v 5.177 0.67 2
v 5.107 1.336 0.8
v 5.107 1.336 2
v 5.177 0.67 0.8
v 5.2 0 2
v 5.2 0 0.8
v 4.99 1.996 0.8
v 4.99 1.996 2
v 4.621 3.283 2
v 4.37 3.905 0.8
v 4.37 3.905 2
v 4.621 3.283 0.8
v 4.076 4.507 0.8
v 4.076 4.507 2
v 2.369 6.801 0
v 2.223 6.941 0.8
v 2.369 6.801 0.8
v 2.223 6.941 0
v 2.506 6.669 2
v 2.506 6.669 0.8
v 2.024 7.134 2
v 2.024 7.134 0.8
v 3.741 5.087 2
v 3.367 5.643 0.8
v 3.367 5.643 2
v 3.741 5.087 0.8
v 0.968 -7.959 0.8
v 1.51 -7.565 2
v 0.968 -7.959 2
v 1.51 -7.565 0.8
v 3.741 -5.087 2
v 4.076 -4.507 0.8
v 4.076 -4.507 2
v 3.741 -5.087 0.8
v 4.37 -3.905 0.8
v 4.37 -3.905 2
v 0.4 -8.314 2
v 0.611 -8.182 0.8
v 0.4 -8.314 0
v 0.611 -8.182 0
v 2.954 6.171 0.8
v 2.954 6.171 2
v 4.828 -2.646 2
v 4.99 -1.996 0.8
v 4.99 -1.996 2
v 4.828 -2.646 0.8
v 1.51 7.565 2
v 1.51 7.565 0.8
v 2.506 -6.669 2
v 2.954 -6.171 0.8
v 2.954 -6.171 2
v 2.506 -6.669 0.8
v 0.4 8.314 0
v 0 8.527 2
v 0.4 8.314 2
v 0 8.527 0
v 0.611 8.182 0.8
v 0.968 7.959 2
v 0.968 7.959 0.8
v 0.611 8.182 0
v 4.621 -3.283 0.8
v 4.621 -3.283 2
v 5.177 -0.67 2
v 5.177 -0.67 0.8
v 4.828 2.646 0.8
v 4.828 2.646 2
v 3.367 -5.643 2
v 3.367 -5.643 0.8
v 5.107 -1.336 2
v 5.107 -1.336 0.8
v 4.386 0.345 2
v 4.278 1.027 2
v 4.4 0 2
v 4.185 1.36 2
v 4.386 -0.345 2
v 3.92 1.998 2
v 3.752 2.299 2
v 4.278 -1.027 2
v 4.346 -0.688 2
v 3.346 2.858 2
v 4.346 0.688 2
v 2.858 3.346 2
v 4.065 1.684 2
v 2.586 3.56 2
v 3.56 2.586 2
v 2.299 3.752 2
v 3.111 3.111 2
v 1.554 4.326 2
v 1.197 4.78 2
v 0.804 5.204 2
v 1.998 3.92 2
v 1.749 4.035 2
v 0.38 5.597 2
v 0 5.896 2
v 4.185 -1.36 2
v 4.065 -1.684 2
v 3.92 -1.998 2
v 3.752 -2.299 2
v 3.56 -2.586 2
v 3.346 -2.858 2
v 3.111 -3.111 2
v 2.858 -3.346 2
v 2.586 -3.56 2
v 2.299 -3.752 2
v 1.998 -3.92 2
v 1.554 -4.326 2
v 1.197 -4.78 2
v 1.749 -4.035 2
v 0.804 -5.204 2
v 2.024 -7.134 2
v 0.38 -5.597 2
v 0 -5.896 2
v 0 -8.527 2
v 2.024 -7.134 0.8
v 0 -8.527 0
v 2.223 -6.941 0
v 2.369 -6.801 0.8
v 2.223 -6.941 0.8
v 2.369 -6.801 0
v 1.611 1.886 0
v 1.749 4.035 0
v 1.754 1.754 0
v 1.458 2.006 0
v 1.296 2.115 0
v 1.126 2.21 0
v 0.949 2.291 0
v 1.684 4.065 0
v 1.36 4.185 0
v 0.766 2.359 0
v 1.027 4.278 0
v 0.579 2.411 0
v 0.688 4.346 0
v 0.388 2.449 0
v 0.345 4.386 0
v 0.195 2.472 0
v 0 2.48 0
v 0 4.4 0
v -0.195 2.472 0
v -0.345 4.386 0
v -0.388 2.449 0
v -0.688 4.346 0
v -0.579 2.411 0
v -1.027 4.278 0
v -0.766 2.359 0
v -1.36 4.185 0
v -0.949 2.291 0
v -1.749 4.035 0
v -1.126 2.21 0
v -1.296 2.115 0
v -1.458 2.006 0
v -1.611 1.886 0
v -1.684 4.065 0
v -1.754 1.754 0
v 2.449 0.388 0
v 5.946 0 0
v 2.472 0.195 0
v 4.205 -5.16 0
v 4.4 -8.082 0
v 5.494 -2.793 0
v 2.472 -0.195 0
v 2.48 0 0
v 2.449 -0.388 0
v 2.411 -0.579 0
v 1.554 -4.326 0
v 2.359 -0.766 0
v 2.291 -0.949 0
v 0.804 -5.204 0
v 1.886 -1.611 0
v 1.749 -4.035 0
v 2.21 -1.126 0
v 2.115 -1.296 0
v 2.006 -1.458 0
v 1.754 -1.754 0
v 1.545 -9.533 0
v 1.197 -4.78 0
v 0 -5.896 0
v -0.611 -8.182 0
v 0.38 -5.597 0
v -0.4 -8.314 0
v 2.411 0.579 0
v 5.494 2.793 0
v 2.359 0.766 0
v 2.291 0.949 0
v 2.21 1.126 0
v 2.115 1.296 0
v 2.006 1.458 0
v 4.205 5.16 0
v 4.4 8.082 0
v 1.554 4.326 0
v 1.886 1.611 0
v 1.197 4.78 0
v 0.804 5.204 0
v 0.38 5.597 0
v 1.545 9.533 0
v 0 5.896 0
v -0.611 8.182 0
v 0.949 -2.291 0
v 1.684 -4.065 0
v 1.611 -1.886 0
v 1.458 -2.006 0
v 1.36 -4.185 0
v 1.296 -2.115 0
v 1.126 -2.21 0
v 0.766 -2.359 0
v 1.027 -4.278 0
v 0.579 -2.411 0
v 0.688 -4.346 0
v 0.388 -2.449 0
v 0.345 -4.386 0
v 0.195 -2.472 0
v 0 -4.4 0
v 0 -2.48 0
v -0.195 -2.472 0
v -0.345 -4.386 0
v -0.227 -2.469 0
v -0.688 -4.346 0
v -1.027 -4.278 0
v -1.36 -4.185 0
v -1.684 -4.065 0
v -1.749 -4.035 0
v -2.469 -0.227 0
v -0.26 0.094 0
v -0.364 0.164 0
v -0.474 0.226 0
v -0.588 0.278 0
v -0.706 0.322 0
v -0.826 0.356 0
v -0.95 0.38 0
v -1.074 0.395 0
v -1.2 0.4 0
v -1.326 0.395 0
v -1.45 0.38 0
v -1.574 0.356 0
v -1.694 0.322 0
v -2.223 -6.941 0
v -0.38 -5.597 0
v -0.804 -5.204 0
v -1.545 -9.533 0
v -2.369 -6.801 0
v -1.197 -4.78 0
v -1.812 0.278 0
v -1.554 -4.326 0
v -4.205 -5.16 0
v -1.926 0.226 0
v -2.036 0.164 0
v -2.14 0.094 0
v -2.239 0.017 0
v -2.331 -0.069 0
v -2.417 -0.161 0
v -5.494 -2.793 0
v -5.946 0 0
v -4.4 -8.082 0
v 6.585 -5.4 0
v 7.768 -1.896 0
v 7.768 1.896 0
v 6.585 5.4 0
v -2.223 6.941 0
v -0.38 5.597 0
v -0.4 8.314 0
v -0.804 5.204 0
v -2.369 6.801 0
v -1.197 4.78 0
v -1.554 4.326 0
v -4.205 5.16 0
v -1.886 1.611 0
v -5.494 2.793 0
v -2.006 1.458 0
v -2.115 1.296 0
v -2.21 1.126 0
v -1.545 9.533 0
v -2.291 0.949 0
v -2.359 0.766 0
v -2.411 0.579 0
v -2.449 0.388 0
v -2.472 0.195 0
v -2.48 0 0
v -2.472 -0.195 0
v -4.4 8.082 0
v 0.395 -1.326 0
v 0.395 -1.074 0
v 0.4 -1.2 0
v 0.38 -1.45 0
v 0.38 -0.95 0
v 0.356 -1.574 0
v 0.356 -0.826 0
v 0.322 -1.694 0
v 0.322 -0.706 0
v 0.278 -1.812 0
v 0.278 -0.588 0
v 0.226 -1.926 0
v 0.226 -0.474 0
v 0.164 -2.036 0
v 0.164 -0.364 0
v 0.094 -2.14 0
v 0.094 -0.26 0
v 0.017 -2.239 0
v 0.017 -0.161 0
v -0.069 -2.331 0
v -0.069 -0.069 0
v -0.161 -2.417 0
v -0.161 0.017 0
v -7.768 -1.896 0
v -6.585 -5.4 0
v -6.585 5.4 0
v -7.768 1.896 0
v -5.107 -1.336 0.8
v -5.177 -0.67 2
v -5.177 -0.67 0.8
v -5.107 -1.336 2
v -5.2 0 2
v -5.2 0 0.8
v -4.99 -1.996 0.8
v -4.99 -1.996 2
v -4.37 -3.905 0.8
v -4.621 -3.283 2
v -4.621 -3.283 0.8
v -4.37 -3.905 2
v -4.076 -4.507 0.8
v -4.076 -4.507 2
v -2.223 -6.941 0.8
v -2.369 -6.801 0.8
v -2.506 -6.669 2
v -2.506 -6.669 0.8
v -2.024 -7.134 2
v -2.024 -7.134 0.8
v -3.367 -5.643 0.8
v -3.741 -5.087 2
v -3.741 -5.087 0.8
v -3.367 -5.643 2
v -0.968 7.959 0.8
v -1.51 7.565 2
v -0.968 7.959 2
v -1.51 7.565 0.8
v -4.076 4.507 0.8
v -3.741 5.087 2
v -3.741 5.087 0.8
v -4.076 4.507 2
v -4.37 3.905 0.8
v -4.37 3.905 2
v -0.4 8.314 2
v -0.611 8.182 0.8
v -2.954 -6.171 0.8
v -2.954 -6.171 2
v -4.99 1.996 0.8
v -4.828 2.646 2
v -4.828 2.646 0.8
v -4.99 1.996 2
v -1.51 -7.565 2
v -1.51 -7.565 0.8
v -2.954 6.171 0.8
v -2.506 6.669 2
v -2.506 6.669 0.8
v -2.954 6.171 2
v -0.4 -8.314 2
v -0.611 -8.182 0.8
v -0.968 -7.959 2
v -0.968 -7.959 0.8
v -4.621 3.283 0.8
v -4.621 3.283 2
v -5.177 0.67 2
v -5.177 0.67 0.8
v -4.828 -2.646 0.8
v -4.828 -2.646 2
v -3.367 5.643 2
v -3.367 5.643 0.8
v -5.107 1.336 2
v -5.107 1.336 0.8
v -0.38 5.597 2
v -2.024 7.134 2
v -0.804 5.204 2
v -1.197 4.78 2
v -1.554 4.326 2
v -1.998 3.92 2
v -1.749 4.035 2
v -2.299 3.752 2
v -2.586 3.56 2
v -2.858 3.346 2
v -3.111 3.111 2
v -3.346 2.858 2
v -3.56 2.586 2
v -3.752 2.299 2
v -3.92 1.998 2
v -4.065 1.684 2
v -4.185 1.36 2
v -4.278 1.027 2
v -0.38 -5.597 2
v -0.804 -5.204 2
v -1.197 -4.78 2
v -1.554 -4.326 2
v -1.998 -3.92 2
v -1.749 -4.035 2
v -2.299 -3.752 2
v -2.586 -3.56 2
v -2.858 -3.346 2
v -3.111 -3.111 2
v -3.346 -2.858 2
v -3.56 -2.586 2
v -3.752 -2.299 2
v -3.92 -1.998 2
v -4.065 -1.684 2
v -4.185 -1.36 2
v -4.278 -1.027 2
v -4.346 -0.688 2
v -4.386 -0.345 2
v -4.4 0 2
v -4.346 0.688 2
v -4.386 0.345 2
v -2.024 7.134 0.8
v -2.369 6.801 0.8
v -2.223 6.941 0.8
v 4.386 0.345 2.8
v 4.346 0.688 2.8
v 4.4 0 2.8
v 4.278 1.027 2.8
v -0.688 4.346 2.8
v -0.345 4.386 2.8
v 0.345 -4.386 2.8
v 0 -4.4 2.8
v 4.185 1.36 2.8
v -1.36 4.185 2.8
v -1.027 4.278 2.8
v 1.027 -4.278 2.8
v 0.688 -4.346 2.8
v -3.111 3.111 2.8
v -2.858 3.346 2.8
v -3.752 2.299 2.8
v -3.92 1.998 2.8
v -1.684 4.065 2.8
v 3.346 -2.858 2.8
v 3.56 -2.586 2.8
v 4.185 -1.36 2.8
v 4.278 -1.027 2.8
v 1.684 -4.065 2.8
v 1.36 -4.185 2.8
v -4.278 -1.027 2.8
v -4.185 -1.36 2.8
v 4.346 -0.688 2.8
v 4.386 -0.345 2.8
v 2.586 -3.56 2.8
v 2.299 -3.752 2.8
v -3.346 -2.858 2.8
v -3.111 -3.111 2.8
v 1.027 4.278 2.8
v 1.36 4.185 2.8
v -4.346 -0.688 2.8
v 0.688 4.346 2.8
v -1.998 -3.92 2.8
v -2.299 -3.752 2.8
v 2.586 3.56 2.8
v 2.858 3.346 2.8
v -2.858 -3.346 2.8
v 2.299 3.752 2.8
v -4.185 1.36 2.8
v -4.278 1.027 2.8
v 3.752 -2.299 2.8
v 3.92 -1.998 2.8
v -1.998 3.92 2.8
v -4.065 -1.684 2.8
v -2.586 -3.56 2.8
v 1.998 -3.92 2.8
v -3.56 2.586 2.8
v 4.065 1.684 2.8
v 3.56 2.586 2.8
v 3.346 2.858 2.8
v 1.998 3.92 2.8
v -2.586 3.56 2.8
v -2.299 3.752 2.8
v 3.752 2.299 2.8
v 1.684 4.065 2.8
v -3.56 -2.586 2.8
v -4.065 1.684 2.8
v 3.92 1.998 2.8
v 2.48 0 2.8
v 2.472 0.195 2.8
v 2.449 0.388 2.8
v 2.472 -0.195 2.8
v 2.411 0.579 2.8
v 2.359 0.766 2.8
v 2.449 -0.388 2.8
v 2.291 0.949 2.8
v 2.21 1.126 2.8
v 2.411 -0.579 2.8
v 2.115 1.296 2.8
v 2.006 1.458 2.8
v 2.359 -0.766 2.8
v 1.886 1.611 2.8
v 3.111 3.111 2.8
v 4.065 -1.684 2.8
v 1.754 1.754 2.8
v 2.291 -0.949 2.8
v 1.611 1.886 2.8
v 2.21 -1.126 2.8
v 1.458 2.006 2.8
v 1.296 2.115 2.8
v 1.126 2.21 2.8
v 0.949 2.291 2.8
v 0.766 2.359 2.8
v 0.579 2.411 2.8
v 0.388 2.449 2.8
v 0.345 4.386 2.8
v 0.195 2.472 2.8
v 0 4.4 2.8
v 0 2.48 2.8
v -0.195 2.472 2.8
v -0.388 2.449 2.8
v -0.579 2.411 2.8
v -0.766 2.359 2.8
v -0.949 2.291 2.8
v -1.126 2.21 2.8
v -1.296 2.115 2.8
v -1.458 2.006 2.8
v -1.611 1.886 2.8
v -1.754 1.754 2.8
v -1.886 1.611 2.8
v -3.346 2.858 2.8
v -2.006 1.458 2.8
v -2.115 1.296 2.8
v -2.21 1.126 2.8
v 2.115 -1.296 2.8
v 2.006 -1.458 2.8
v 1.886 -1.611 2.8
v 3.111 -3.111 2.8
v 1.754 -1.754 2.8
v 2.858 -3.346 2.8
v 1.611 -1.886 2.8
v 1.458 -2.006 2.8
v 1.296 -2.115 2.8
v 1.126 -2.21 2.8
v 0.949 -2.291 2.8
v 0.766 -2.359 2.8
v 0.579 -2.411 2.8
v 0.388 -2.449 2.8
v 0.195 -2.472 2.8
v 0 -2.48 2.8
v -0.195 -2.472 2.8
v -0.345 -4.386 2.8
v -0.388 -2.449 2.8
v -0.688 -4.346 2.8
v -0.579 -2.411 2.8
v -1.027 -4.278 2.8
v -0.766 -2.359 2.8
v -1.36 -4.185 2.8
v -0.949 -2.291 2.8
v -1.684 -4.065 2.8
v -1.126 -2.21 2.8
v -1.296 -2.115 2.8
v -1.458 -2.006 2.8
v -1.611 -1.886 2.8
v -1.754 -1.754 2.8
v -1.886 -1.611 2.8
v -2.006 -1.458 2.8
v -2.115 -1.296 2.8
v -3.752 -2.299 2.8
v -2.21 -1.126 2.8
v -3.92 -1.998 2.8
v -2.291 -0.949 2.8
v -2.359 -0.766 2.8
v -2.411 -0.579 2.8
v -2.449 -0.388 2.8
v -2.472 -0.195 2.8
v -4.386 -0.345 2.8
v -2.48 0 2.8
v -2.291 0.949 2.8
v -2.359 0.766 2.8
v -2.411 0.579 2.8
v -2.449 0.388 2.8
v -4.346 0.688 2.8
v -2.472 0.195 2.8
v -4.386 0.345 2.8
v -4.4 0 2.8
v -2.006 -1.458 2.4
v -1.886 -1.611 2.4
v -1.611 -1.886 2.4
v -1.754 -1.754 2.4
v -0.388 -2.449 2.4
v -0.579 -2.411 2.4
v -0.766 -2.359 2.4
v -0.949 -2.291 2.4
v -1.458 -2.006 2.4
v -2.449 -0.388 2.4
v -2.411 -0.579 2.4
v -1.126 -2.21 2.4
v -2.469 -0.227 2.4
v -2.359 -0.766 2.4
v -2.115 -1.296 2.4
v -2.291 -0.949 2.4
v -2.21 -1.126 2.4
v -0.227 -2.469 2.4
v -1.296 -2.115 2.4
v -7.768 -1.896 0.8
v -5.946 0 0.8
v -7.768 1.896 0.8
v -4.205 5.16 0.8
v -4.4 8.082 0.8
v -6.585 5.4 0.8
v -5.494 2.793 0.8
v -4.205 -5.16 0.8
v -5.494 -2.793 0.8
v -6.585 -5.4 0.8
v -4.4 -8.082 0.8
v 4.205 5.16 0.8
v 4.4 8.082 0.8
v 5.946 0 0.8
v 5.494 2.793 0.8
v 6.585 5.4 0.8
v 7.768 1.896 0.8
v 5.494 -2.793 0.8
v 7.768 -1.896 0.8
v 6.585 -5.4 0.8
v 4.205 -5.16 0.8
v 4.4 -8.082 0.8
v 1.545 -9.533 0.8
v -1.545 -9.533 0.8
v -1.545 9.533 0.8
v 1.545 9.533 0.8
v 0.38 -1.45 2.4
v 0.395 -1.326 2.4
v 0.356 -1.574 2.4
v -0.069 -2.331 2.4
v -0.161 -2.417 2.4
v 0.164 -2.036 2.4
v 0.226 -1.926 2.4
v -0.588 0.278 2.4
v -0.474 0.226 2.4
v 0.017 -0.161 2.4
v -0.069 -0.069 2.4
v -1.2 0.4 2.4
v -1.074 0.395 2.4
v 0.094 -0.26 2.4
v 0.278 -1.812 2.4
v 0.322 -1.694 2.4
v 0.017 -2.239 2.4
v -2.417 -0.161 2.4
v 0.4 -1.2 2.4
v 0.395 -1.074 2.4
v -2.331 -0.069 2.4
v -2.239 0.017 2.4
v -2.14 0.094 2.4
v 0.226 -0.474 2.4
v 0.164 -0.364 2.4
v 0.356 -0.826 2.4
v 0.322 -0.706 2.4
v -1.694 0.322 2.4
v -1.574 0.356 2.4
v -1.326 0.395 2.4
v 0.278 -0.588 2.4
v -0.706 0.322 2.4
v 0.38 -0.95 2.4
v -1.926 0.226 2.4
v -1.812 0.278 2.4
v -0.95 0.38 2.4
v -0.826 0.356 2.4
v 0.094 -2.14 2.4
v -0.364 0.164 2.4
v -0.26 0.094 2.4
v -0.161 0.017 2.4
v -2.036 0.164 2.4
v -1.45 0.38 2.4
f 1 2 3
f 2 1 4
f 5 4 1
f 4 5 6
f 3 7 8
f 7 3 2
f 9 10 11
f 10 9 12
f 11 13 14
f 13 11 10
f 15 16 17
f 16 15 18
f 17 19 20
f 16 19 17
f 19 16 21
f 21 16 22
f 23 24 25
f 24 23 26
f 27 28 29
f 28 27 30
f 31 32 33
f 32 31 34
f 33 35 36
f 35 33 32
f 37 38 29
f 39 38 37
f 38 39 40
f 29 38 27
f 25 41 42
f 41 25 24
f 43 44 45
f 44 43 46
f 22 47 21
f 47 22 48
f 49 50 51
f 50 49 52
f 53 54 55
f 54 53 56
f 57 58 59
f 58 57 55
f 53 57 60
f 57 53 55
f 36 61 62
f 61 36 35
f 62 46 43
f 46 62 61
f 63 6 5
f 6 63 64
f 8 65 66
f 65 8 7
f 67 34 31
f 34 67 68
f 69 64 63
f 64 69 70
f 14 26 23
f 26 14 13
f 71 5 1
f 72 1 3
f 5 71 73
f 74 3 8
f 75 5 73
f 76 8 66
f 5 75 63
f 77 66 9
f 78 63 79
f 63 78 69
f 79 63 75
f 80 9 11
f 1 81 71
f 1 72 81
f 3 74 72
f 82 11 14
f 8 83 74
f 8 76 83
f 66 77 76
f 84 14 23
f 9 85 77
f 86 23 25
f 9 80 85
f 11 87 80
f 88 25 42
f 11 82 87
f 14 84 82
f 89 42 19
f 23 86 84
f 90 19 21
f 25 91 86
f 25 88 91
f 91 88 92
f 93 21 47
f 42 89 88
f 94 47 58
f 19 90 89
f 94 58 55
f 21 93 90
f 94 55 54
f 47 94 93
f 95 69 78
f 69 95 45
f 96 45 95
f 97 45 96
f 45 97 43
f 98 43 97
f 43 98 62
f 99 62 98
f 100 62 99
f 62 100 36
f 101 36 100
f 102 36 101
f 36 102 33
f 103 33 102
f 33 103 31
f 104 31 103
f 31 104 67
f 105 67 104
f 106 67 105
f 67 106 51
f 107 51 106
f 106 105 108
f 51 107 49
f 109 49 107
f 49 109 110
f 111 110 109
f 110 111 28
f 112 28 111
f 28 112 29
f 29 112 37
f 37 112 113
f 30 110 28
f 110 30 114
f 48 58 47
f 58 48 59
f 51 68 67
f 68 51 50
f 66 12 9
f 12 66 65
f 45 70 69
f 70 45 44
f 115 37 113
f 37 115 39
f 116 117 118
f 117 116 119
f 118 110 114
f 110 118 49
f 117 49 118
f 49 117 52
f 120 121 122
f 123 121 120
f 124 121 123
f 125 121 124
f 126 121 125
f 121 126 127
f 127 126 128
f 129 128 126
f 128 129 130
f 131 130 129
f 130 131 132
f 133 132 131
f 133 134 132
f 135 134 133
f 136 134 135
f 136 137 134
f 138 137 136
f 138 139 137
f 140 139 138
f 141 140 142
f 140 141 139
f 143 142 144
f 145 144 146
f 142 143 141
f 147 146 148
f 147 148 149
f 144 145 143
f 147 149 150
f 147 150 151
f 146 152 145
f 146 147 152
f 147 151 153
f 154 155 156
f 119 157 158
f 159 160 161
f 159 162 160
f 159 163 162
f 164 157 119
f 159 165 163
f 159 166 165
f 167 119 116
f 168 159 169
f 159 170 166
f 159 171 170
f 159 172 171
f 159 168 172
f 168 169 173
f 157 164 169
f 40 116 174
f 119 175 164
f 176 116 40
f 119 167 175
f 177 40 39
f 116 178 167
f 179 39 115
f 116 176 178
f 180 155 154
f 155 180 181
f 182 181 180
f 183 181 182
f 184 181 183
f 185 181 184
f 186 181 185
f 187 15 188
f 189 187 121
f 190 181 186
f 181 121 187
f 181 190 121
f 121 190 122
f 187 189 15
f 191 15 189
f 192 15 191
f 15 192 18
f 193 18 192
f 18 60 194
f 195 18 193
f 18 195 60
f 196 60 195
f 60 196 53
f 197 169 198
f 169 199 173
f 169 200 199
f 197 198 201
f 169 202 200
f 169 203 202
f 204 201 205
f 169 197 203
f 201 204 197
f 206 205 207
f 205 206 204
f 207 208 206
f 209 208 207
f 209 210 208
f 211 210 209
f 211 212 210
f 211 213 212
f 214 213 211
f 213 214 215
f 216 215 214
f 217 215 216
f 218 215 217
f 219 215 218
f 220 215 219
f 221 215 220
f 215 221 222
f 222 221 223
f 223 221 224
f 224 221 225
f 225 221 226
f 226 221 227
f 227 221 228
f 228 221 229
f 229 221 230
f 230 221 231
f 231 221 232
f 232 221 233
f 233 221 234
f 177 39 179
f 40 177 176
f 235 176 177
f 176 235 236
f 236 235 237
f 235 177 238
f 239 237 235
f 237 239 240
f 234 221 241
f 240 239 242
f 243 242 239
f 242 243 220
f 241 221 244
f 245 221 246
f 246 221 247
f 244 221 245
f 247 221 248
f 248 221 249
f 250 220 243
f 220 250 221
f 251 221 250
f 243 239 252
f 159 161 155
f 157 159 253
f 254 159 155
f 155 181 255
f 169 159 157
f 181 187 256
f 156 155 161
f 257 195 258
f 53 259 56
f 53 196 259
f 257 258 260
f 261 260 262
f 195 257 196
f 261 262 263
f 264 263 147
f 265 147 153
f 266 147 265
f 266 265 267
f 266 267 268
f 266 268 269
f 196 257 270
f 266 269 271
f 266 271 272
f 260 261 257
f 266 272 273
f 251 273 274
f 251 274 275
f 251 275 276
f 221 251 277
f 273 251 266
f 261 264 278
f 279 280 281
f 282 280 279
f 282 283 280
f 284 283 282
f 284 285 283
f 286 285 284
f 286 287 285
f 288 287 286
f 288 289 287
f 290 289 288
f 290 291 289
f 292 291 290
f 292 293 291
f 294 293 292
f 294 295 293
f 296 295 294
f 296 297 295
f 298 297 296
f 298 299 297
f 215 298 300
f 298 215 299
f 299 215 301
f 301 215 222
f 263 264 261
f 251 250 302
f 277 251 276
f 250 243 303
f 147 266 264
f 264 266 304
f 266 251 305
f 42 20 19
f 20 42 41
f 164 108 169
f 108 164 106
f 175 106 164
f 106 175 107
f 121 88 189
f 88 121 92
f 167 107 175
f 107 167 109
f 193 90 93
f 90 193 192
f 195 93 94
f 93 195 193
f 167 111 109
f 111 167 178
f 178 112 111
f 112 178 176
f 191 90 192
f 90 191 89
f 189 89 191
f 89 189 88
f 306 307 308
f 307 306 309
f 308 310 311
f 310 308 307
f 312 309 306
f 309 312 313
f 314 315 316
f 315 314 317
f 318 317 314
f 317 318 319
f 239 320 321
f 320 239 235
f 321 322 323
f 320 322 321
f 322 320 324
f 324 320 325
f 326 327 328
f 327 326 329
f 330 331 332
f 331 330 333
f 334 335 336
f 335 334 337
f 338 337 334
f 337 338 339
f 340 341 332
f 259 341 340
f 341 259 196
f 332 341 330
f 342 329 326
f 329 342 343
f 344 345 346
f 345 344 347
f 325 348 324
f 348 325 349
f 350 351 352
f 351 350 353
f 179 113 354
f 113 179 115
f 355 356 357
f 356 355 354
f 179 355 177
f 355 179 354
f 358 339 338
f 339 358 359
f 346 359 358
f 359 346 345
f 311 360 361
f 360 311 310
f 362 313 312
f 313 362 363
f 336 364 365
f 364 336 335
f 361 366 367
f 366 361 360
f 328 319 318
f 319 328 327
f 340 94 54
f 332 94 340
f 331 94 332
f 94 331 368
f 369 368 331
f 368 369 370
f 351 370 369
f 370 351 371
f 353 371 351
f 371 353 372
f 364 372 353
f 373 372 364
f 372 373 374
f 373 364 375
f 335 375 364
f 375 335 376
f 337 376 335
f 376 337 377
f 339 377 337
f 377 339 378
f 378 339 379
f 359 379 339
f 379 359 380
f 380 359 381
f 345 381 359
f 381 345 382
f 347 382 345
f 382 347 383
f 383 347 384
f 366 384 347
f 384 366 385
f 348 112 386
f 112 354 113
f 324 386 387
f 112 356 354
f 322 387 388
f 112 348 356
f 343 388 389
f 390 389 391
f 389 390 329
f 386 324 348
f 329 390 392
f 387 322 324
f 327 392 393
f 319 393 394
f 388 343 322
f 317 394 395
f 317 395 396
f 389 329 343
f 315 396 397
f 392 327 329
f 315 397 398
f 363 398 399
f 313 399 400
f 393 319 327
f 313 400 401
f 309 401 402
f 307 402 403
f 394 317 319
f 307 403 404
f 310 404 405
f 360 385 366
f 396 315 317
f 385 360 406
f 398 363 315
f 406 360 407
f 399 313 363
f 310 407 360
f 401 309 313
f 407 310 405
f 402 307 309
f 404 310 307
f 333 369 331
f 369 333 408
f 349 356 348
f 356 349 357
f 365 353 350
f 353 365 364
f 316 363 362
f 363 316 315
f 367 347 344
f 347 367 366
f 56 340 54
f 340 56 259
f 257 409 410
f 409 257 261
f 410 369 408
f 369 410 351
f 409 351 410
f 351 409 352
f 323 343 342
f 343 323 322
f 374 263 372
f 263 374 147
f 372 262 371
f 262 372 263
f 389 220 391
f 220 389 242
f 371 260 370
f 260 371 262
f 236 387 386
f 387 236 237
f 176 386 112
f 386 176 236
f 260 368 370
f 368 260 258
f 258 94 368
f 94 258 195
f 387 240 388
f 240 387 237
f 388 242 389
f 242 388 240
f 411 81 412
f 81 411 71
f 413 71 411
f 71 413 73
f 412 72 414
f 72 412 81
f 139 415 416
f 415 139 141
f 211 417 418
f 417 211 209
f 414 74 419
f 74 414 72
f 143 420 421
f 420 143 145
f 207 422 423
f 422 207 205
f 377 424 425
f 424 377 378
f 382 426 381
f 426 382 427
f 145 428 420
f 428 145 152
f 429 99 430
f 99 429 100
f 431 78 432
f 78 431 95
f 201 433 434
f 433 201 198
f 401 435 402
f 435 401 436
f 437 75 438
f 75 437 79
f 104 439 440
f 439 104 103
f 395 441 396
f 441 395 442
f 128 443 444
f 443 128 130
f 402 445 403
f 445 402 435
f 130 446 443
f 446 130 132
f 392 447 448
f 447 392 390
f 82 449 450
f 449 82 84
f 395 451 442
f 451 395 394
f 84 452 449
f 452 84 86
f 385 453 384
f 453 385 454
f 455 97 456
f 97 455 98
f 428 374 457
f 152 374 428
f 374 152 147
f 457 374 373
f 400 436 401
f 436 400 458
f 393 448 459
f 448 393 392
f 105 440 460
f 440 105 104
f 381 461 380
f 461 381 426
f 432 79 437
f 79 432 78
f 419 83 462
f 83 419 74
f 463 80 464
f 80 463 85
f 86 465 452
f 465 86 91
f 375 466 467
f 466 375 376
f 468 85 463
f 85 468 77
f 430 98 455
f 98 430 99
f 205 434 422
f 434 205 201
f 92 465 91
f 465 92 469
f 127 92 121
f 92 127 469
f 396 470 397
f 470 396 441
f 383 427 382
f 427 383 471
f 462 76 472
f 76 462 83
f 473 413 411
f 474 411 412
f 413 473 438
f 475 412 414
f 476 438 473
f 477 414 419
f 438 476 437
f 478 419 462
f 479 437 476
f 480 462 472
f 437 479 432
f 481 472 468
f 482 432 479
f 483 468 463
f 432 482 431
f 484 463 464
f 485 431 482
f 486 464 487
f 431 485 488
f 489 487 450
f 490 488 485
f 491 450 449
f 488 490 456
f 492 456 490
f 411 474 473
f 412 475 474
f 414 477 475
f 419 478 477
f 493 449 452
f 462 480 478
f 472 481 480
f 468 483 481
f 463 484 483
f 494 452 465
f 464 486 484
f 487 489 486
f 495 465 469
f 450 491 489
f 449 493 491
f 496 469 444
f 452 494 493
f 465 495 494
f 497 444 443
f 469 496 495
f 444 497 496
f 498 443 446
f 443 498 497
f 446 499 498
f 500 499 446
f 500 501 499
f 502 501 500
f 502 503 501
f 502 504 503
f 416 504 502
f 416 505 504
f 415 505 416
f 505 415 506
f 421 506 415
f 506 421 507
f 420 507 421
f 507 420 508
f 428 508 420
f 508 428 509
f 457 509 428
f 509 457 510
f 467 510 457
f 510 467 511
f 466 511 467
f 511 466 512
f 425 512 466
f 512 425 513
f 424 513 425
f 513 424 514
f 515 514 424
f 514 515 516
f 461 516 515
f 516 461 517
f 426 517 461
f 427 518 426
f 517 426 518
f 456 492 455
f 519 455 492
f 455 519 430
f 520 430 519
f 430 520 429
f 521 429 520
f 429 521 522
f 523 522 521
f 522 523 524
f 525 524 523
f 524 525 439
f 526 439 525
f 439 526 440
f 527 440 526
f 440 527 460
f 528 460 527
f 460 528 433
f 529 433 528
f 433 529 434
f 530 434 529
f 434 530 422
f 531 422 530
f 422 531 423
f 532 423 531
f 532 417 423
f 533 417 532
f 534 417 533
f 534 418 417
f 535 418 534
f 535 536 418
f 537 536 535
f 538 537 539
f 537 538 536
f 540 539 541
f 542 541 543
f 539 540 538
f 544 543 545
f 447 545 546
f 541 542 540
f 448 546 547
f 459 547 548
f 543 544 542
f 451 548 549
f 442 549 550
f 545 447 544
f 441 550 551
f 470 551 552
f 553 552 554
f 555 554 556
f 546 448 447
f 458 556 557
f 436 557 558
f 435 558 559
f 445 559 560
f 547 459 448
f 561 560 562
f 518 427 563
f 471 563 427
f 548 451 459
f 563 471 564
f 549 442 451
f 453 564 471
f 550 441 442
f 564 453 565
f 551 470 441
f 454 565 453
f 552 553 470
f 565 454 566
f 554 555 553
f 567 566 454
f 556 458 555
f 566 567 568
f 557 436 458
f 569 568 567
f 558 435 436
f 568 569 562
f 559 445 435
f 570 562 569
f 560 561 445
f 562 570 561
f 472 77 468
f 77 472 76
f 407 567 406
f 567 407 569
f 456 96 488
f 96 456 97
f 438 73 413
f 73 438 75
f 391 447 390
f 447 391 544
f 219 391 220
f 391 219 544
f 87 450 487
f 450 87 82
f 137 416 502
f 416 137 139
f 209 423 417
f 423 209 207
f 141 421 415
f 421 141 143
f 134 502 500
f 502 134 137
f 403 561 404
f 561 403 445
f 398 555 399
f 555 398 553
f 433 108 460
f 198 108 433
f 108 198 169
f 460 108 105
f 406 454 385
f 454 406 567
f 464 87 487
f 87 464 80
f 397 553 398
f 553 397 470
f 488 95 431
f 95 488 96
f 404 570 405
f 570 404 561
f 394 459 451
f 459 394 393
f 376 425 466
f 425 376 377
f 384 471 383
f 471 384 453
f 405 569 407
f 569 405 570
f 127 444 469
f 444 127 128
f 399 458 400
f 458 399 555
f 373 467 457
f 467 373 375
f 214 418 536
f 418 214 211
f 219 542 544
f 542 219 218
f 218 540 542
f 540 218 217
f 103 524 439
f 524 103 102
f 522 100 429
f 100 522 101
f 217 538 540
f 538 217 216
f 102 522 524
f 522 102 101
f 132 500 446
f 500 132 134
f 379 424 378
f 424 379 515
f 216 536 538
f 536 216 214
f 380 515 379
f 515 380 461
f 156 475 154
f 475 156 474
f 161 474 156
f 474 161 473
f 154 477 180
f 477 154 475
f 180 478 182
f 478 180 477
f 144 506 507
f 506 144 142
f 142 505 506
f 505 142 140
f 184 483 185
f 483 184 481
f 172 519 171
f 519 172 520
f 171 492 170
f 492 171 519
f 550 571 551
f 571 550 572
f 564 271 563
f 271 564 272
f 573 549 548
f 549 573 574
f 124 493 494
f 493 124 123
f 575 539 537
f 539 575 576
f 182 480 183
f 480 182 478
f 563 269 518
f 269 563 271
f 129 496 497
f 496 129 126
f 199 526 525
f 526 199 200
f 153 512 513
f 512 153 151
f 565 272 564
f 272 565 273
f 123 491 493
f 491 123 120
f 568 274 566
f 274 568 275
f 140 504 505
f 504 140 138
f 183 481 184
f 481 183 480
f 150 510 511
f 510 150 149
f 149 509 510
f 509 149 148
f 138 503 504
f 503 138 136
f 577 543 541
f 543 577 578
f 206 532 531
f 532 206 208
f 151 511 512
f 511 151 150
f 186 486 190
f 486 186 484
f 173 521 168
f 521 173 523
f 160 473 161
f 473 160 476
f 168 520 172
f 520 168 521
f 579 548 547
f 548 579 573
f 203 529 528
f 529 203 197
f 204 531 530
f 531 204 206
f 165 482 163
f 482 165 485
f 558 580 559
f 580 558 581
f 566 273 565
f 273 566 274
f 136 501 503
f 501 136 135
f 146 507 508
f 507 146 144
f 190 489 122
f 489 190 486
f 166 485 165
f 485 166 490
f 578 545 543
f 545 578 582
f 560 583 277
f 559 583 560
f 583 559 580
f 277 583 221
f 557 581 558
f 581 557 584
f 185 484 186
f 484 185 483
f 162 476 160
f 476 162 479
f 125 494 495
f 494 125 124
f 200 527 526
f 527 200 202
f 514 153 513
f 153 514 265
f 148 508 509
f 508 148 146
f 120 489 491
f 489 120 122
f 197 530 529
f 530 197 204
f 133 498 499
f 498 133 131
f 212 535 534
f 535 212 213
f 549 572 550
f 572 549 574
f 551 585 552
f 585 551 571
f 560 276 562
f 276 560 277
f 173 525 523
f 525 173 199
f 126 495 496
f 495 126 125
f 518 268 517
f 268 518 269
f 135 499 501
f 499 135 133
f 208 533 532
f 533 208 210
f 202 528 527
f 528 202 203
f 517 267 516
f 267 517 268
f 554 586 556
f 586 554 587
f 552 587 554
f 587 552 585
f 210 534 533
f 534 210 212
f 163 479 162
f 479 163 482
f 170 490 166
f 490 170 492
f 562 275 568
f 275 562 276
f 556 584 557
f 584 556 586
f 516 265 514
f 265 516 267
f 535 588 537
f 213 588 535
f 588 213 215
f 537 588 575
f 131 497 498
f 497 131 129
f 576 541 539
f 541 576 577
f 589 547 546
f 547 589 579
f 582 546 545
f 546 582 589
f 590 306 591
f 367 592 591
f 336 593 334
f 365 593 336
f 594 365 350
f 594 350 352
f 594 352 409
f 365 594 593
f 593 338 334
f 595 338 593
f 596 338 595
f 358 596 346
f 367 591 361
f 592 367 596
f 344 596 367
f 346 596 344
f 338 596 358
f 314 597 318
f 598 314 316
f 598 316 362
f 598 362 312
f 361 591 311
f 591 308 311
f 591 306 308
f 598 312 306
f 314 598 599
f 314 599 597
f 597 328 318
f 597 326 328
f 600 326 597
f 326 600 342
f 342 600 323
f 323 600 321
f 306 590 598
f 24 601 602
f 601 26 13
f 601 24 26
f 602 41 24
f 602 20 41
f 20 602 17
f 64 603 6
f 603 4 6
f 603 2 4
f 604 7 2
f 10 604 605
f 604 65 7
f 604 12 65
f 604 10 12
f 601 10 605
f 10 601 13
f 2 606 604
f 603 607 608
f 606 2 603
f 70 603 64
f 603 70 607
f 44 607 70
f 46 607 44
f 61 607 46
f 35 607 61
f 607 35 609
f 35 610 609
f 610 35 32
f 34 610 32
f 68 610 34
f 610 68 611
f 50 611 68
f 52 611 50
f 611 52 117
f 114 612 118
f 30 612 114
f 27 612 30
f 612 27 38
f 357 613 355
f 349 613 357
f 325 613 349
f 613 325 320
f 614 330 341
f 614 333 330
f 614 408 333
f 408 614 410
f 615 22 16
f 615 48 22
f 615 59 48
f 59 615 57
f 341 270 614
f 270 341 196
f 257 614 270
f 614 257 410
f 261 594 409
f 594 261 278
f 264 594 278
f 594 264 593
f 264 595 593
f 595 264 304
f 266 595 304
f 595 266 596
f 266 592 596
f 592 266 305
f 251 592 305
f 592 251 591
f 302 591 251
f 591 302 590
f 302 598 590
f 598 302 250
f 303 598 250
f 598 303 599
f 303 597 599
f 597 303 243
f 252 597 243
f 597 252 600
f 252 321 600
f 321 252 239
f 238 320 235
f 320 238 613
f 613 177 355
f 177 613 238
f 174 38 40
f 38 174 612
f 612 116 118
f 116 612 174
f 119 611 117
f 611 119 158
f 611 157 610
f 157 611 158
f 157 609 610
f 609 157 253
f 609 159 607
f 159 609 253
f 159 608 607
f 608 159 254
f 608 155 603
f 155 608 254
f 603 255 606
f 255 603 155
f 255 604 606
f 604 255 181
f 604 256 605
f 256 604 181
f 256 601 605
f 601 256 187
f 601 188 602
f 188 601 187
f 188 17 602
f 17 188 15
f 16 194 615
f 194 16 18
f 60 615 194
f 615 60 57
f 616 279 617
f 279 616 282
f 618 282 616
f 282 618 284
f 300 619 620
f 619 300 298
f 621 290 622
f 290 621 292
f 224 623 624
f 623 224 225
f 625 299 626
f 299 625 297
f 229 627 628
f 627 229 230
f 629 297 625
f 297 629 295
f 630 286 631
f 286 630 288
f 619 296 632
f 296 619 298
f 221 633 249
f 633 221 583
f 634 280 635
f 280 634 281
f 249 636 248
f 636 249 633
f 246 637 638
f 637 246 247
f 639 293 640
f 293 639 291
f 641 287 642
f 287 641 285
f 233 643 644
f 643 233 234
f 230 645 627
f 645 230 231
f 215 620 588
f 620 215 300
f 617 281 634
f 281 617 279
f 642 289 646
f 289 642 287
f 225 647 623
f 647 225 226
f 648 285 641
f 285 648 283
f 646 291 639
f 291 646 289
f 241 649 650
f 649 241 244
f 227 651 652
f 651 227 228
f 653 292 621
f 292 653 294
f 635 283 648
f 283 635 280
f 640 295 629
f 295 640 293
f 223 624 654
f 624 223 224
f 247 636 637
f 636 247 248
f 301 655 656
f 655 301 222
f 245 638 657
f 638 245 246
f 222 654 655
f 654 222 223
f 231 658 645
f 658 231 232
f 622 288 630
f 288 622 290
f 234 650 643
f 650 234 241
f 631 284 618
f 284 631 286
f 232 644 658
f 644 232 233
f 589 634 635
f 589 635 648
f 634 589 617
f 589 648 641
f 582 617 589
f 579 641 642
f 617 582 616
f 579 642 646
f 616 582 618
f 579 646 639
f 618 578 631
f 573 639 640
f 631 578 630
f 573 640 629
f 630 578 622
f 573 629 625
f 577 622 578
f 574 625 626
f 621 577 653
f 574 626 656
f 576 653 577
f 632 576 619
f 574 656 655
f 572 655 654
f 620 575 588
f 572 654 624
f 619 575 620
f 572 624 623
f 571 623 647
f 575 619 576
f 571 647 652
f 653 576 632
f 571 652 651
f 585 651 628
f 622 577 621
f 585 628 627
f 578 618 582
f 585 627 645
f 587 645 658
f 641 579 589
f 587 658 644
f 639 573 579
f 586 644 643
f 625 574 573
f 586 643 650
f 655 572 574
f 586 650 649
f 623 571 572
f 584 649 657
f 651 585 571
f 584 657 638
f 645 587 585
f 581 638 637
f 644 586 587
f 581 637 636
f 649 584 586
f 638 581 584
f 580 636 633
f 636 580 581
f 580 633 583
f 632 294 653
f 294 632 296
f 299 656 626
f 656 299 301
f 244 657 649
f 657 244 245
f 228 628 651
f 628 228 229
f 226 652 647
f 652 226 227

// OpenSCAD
/*
 * Changes from Guido's original version:
 * - converted outline code to use iterator for simplicity of modification
 * - adjusted inside cylinder of eye from 9.5 rad to 9.2 rad to help with build
 * - adjusted inside cylinder of cornea from 3.5 rad to 3.1 rad to help with build
 * - re-scaled token (at bottom of file) by 0.8x in all dimensions
 */

module focus() {

/* outline of eye */
for (i=[0:1]) {
	rotate([0,0,180*i]) difference() {
		translate([-5.5, 0, 0]) difference() {
			cylinder(h = 2.5, r = 12, $fn = 90);
			translate([0, 0, -0.5]) cylinder(h = 10, r = 9.2, $fn = 80);
		}
		translate([-100, -100., -100]) cube([100, 200, 200]);
	}
}

difference() {
	cylinder(h = 3.5, r = 5.5, $fn = 80);
	translate([0, 0, -0.5]) cylinder(h = 10, r = 3.1, $fn = 80);
}

translate([-1.5, -1.5, 0]) {
	cylinder(h = 3, r = 2, $fn = 80);
}

rays = 16;

difference() {
	union() scale([1.1, 1.35, 1]) {
		for(i = [0:rays - 1]) {
			rotate([0, 0, ((360 / rays) / 2) + (i * (360 / rays))]) {
				linear_extrude(height = 1) {
					polygon([[-5, 0], [5, 0], [0, 9]]);
				}
			}
		}
	}
	union() {
		intersection() {
			translate([-5.5, 0, -1]) cylinder(h = 5, r = 11, $fn = 80);
			translate([5.5, 0, -1]) cylinder(h = 5, r = 11, $fn = 80);
		}
	}
}

}

scale([0.8,0.8,0.8]) focus();

// cube(10, 10, 10);
